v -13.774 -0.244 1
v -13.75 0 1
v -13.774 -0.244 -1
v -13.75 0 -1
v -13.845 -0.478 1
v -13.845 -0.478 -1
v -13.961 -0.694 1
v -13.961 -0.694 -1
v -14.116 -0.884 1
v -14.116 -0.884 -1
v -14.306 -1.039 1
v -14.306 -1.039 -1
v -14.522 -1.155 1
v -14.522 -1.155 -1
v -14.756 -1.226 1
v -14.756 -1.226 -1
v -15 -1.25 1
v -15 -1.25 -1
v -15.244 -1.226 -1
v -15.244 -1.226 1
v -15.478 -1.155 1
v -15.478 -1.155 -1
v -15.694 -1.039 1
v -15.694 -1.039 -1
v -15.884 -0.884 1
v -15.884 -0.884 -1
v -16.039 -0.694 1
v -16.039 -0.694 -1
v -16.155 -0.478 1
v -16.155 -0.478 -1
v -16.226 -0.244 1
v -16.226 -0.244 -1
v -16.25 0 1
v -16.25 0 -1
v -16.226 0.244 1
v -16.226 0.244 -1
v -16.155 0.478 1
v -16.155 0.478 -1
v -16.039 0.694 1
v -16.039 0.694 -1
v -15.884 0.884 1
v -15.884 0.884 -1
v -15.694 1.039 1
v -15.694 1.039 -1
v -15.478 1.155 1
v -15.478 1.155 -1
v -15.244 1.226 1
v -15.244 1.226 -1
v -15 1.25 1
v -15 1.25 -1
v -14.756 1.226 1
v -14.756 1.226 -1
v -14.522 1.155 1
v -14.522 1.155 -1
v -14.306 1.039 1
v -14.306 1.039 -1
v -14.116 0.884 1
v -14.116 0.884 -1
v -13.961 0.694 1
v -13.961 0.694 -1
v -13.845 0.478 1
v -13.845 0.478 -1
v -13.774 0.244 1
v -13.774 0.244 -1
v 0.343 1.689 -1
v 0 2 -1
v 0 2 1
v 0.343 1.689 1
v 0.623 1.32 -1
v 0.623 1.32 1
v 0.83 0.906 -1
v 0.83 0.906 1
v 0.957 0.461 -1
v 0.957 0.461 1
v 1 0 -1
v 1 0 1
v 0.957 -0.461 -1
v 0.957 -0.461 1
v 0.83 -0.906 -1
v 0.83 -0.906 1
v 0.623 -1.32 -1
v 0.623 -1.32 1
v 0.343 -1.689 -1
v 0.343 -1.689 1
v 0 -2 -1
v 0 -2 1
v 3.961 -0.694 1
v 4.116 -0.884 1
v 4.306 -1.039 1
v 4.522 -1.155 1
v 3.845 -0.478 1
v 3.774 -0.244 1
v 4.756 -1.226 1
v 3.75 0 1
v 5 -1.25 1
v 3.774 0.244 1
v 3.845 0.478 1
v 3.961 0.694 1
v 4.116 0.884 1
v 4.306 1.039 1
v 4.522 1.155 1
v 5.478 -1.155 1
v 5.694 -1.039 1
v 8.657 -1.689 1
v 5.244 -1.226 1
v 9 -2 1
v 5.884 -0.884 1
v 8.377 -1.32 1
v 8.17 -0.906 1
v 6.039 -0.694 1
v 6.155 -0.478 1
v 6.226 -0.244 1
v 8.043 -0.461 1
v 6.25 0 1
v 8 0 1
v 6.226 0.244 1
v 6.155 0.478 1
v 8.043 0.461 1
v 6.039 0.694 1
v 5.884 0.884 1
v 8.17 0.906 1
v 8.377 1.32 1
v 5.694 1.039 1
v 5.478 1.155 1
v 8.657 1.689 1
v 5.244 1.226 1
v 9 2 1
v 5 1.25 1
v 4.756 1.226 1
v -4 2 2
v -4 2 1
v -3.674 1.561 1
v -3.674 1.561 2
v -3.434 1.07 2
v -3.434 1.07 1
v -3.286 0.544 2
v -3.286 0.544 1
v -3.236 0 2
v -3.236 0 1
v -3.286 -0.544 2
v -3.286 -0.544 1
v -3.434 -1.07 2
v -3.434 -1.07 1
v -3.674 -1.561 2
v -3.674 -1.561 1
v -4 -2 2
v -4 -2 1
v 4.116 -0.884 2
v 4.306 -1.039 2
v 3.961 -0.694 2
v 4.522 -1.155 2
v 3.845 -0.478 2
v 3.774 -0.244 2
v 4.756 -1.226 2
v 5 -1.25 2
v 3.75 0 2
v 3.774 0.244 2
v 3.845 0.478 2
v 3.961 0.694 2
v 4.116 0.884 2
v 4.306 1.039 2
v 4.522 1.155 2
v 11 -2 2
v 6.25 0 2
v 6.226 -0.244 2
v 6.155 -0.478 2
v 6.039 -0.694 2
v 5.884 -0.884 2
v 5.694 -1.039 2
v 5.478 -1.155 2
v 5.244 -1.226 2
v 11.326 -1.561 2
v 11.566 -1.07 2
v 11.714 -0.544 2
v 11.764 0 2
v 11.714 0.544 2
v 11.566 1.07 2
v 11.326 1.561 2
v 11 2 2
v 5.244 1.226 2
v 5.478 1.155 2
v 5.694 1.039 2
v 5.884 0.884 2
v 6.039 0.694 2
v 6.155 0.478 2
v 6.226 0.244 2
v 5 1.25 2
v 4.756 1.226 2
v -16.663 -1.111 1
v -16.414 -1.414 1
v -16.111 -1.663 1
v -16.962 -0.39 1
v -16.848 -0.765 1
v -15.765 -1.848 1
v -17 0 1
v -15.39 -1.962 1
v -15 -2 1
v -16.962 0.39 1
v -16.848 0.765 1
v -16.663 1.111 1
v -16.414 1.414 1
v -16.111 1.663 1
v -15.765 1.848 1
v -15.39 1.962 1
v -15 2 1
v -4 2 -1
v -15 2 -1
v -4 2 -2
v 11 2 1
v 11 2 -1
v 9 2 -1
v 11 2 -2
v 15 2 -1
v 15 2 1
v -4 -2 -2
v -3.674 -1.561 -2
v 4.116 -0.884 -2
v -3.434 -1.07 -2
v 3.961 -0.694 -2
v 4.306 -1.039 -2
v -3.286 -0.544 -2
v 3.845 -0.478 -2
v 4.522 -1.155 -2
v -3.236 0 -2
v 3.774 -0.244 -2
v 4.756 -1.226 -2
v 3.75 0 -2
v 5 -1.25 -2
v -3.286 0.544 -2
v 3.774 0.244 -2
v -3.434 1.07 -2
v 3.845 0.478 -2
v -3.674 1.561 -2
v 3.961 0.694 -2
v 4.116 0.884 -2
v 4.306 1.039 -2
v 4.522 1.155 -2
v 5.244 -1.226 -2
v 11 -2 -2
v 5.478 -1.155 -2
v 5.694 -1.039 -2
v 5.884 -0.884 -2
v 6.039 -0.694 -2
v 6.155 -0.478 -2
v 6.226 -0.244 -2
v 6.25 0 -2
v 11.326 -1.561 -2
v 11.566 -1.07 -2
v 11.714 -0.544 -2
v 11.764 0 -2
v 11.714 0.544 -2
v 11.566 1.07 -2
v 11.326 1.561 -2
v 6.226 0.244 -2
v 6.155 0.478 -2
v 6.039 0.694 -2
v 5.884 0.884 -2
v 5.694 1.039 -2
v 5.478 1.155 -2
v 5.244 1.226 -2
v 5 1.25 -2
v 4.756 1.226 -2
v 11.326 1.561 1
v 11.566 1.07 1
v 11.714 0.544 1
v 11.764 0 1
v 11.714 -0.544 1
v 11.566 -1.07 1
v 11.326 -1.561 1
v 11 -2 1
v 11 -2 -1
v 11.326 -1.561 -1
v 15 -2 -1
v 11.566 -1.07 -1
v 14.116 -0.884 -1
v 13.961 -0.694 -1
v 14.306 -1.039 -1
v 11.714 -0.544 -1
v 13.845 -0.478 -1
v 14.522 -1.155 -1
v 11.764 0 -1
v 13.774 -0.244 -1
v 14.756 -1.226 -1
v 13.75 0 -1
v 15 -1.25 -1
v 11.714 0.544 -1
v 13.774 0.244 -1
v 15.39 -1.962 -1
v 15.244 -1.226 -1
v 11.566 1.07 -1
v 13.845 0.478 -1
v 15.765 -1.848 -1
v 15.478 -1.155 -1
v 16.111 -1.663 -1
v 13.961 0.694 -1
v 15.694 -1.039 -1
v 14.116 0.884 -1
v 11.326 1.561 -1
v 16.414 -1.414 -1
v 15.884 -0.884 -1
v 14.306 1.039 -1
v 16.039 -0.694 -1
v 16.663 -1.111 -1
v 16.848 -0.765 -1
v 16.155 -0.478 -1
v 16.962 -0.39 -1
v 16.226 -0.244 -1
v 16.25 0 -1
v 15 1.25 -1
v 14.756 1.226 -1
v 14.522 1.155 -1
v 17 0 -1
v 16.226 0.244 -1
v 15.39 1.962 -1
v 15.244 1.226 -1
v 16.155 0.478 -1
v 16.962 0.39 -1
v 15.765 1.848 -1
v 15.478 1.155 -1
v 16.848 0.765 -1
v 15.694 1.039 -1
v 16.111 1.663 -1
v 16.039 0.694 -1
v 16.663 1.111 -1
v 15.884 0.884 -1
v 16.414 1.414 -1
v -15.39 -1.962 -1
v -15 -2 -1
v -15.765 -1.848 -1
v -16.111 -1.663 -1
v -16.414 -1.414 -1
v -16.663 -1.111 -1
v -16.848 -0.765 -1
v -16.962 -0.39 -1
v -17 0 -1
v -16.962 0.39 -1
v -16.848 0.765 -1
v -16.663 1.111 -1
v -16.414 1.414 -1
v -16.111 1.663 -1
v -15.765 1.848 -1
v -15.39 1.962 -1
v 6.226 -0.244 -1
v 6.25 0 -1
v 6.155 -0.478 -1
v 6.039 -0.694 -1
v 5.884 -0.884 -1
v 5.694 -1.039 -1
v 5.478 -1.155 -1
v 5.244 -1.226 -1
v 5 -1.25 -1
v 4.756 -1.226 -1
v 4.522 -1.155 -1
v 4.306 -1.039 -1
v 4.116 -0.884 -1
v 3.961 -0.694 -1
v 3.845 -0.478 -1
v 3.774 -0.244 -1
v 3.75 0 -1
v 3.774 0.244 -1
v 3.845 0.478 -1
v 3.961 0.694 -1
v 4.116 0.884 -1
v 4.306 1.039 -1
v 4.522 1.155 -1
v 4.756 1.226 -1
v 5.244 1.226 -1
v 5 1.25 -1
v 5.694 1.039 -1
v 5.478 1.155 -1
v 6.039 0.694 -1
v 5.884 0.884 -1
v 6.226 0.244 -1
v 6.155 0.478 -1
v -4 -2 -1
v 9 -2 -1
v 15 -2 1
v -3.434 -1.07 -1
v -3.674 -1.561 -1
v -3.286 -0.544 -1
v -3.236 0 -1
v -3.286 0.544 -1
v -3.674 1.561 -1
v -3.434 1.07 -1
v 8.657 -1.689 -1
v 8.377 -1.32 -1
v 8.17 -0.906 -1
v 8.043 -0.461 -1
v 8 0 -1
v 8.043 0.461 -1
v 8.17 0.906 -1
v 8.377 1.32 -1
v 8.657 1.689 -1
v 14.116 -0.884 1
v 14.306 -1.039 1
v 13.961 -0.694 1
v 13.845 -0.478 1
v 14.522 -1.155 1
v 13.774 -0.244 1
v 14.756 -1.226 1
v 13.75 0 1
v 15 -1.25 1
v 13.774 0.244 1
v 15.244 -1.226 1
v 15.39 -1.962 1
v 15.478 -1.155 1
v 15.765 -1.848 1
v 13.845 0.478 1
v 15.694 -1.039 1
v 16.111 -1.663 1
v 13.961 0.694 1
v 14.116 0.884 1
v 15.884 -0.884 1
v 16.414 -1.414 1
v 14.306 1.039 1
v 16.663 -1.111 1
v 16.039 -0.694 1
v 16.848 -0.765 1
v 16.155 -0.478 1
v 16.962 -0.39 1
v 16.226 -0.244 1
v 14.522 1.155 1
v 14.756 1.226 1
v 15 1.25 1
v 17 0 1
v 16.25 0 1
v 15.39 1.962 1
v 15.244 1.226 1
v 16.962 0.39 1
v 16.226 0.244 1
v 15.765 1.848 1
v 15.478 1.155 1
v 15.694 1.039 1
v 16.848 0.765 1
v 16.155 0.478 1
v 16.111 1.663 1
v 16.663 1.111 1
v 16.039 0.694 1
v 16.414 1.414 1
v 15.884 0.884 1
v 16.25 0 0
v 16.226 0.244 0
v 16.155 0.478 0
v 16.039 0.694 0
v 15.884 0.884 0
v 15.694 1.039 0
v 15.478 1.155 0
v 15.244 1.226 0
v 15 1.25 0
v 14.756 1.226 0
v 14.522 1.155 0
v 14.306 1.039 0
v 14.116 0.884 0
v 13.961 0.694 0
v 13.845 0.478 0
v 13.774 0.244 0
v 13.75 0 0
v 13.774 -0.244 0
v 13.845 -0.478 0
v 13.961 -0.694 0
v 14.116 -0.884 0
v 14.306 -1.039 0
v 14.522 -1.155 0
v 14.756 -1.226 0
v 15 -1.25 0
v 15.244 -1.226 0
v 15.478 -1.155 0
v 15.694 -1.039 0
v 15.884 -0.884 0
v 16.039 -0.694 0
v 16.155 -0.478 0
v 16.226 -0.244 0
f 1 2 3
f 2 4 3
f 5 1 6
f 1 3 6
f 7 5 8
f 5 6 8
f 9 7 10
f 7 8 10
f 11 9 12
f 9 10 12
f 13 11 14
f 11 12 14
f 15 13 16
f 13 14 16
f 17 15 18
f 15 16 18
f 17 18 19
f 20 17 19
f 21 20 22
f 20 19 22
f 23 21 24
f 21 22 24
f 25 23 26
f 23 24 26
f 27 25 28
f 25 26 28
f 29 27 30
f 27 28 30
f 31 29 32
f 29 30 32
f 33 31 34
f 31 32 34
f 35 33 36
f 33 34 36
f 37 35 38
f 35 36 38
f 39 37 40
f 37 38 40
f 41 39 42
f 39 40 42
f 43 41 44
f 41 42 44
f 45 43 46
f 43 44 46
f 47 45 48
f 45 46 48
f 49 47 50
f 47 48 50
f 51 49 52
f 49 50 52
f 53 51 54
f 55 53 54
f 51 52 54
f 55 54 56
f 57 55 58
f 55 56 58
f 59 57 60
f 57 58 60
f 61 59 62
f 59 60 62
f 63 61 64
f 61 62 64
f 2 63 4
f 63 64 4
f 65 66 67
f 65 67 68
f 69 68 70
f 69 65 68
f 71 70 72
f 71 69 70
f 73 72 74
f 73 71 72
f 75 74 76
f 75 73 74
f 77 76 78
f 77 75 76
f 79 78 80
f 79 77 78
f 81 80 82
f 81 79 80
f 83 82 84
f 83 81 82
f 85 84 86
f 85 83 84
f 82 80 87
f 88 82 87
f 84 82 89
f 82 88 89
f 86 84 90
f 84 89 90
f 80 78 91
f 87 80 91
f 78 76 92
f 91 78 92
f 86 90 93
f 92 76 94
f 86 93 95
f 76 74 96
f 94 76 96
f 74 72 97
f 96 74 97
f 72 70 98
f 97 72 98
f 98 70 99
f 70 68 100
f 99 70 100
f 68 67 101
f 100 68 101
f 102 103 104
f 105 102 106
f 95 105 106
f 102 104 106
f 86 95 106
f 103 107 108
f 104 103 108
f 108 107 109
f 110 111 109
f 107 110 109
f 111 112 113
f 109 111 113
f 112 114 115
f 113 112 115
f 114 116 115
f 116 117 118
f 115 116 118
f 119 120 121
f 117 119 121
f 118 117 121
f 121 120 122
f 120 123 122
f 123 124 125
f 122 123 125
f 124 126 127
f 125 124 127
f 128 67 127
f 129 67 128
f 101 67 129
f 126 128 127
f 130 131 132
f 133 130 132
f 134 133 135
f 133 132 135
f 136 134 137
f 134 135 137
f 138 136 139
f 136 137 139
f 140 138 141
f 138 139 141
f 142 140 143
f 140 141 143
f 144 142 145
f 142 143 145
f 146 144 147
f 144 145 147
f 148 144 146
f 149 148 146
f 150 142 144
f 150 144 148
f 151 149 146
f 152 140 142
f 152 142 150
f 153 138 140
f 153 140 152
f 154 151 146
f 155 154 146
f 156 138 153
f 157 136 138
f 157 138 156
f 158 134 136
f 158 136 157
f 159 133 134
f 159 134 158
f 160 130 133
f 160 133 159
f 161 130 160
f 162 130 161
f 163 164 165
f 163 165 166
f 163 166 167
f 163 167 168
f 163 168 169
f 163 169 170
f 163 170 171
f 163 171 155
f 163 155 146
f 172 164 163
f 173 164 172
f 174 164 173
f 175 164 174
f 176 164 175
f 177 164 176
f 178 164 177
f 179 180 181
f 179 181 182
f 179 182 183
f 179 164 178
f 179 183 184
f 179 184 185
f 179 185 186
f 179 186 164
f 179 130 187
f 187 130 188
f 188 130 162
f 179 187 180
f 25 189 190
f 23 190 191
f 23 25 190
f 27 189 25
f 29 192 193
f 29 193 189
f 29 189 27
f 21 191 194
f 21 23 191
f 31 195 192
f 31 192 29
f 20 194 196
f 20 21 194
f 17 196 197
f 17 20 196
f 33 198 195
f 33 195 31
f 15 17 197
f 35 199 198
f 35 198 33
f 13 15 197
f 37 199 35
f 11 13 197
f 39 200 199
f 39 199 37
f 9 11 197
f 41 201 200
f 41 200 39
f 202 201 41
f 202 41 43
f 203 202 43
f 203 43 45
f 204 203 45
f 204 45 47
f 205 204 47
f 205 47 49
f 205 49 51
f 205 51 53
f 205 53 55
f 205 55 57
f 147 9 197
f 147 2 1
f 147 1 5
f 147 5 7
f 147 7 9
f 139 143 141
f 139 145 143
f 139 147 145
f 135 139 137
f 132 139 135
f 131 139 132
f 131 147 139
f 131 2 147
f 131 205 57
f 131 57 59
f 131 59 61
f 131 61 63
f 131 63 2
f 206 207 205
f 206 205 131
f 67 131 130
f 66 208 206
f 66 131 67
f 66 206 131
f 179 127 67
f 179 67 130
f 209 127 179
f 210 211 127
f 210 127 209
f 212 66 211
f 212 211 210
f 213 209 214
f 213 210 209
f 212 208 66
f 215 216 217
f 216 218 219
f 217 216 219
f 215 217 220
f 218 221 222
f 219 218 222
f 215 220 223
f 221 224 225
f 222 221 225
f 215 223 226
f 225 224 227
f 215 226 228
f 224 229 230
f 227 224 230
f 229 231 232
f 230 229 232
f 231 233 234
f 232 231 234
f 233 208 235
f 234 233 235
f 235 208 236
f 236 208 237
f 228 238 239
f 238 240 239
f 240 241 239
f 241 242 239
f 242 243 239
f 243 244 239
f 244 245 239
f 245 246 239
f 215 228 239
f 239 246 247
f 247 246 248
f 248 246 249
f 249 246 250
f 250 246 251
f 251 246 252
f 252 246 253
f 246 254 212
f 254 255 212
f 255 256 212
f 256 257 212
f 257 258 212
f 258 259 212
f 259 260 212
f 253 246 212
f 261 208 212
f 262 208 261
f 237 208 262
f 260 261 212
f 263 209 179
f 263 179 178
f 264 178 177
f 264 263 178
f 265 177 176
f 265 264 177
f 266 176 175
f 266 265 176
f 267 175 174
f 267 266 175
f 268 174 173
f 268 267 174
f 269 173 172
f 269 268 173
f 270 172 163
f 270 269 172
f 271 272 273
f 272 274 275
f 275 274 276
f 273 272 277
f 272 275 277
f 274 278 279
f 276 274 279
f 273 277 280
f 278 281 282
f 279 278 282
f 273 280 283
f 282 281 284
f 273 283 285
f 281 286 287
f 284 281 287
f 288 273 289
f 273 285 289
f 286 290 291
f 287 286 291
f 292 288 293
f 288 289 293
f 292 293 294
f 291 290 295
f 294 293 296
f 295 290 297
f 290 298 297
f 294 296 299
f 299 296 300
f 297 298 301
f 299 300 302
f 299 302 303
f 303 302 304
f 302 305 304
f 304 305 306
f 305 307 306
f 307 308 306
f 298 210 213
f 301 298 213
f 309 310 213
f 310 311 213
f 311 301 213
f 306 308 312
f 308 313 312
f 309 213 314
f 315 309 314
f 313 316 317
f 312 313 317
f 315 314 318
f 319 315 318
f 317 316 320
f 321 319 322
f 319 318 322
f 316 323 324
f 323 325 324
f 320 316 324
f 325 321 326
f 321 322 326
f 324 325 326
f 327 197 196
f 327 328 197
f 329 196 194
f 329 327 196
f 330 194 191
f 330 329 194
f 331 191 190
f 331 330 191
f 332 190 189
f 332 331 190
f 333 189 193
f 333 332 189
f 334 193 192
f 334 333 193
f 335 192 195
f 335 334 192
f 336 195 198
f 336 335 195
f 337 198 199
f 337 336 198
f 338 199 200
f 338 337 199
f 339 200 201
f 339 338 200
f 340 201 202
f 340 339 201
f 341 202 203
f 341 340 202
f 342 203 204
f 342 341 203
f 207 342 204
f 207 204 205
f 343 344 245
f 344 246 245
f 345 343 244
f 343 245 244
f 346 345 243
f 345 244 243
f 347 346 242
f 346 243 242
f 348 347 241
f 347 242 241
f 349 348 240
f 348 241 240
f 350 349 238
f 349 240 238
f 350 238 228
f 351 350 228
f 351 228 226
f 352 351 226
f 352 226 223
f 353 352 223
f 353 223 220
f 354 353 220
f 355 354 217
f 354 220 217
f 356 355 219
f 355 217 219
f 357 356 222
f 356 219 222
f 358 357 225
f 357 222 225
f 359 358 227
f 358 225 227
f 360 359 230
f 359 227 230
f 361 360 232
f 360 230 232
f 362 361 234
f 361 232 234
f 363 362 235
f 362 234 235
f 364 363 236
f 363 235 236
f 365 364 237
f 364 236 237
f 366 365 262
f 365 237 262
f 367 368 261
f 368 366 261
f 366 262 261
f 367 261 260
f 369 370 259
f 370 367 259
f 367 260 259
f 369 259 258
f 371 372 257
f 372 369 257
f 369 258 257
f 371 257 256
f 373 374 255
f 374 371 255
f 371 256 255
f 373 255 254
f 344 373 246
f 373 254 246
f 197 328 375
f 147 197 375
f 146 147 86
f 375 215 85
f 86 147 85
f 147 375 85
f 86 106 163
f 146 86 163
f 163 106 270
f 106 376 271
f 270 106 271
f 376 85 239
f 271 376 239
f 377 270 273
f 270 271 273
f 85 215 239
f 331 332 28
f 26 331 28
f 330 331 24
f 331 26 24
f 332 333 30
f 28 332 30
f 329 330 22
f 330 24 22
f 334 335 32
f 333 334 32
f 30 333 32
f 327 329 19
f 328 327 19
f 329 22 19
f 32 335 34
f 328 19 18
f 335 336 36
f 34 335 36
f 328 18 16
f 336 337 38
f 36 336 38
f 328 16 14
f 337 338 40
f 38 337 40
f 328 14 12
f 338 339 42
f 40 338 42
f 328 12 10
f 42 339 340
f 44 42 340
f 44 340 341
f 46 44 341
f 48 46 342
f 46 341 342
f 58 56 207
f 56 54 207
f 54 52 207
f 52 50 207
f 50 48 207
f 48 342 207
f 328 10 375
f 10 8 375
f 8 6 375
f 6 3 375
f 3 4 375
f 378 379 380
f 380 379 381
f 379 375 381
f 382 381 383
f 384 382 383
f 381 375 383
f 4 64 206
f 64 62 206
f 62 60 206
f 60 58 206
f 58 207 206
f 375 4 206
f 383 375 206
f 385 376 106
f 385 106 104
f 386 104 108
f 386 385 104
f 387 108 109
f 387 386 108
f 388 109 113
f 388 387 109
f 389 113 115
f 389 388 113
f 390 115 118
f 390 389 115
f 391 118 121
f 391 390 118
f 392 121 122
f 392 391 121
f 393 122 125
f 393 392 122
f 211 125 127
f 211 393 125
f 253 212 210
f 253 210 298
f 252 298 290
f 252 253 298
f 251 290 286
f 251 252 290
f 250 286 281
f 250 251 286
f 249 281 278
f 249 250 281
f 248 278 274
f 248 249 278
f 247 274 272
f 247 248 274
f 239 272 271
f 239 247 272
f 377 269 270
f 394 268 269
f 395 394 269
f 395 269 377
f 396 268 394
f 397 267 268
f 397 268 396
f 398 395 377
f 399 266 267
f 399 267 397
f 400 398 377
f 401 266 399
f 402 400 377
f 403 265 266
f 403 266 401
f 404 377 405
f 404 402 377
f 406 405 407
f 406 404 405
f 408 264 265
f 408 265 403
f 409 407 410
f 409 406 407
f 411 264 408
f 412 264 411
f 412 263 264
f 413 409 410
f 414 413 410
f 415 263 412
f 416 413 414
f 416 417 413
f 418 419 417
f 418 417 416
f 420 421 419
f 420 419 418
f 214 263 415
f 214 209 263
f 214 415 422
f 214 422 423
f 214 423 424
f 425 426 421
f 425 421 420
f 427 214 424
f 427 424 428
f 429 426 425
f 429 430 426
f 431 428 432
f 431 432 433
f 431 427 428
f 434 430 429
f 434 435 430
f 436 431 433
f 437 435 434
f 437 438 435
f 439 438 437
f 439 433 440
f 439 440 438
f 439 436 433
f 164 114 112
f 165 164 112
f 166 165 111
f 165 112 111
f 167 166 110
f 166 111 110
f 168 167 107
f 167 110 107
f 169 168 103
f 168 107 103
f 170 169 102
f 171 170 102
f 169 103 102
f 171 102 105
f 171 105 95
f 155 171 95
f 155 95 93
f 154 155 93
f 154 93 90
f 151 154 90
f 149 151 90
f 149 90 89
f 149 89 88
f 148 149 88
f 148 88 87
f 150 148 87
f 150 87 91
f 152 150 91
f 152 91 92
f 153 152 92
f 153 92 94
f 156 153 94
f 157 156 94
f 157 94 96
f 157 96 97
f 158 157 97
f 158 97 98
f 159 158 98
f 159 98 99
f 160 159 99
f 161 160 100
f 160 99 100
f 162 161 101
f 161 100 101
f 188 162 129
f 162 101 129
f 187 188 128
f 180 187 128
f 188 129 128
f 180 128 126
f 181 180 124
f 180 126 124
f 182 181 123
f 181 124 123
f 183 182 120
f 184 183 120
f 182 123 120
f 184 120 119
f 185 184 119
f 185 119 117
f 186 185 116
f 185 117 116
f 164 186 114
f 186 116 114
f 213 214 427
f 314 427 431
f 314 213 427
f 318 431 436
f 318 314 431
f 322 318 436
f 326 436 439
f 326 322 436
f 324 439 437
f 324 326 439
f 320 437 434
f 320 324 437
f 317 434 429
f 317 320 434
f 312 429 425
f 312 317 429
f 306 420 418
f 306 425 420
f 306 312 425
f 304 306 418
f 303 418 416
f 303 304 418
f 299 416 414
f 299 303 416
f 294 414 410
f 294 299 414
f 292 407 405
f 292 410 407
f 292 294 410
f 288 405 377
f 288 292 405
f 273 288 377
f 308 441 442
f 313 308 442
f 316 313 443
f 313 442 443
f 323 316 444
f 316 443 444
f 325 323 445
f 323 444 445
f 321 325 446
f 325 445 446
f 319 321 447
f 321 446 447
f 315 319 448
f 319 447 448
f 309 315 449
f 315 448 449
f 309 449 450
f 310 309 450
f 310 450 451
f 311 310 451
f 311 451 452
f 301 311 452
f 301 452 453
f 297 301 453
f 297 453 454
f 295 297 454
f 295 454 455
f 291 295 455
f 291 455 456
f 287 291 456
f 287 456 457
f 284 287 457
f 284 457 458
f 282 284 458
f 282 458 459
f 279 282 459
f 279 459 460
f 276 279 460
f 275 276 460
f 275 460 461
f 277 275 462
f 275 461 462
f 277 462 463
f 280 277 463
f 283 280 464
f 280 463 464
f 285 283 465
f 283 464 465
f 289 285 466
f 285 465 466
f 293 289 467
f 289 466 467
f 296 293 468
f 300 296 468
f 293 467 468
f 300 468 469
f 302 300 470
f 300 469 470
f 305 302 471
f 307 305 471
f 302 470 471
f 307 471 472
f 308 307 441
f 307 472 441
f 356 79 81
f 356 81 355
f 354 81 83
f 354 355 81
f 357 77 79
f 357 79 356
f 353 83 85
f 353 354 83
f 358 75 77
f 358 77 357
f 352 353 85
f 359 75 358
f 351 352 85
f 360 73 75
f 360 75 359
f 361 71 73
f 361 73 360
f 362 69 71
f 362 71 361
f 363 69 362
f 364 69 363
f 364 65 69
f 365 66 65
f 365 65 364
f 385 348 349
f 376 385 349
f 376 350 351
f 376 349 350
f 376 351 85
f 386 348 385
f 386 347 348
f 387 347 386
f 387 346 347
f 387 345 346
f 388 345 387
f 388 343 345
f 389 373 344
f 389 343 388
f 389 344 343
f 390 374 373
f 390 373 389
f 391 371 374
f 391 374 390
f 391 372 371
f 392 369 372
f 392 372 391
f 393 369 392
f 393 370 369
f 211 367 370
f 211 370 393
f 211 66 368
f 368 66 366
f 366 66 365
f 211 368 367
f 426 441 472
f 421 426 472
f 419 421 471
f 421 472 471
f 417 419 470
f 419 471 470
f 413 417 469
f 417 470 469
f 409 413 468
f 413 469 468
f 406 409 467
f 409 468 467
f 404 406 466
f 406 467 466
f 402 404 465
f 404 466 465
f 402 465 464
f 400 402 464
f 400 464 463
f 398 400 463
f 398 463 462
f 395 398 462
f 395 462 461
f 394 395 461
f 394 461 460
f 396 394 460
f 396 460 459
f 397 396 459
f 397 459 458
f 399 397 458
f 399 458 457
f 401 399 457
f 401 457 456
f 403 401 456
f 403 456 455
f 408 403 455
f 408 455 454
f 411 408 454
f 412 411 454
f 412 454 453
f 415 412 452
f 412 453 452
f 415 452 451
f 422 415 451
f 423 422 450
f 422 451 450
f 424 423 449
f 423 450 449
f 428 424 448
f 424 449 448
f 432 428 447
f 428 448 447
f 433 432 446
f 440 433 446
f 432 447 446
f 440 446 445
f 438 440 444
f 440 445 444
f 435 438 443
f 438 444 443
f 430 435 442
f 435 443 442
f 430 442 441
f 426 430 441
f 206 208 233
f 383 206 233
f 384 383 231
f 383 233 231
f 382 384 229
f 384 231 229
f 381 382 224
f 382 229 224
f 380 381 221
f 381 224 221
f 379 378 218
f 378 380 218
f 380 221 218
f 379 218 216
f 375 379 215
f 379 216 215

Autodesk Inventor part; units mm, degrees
ref_plane "YZ Plane" through (0, 0, 0) normal (1, 0, 0) x (0, 1, 0)
ref_plane "XZ Plane" through (0, 0, 0) normal (0, 1, 0) x (-1, 0, 0)
ref_plane "XY Plane" through (0, 0, 0) normal (0, 0, 1) x (1, 0, 0)
sketch "Sketch1" plane through (0, 0, 0) normal (0, 0, 1) x (1, 0, 0)
  line L0 (0, 0) -> (15, 0)
  line L1 (0, 0) -> (-15, 0)
  line L2 (0, 0) -> (5, 0)
  circle A0 centre (-15, 0) radius 1.25
  circle A1 centre (15, 0) radius 1.25
  circle A2 centre (-15, 0) radius 2
  circle A3 centre (15, 0) radius 2
  line L3 (-15, 2) -> (15, 2)
  line L4 (-15, -2) -> (15, -2)
  circle A4 centre (5, 0) radius 1.25
  line L5 (-15, 2) -> (-4, 2)
  line L6 (-4, 2) -> (-4, -2)
  line L7 (-4, -2) -> (-15, -2)
  line L8 (-15, -2) -> (-15, 2)
  line L9 (15, 2) -> (12.5, 2)
  line L10 (12.5, -2) -> (15, -2)
  line L11 (15, -2) -> (15, 2)
  line L12 (15, 2) -> (14.5, 2)
  line L13 (15, -2) -> (14.5, -2)
  arc A5 (-4, -2) -> (-4, 2) centre (-6.2361, 0) ccw
  line L14 (5, 0) -> (1, 0)
  arc A6 (0, -2) -> (0, 2) centre (-1.5, 0) ccw
  line L15 (0, 2) -> (0, -2)
  line L16 (5, 2) -> (9, 2)
  line L17 (9, 2) -> (9, -2)
  line L18 (5, 0) -> (8, 0)
  arc A7 (9, 2) -> (9, -2) centre (10.5, 0) ccw
  line L19 (-15, 2) -> (-14.5, 2)
  line L20 (-15, -2) -> (-14.5, -2)
  arc A8 (-14.5, -2) -> (-14.5, 2) centre (-14.5, 0) ccw
  line L21 (9, 2) -> (11, 2)
  line L22 (9, -2) -> (11, -2)
  arc A9 (11, -2) -> (11, 2) centre (8.7639, 0) ccw
  point P0 (-4, 2)
  dimension "d1" = 15
  dimension "d2" = 15
  dimension "d3" = 5
  dimension "d4" = 2.5
  dimension "d6" = 2.5
  dimension "d7" = 4
  dimension "d8" = 4
  dimension "d9" = 2.5
  dimension "d10" = 11
  dimension "d16" = 4
  dimension "d17" = 3
  dimension "d18" = 4
  dimension "d21" = 4
  dimension "d23" = 3
  dimension "d24" = 0.5
  dimension "d25" = 0.5
  dimension "d26" = 2
  dimension "d35" = 2
  dimension "d36" = 2
  dimension "d37" = 3
  dimension "d38" = 4
extrude "Extrusion1" add sketch "Sketch1" along normal mid plane 2 contours A5 L6 L1 | L1 L6 A5 | L6 L4 A8 L1 | L1 A8 L3 L6 | A8 L4 A2 L1 | L1 A2 L3 A8 | A9 L0 A3 L4 | A2 L8 A0 L1 | L1 A0 L8 A2 | A2 L8 A0 | L3 A3 L0 A9 | A3 L11 A1 L0 | L0 A1 L11 A3 | L11 A1 A3
extrude "Extrusion2" add sketch "Sketch1" along normal mid plane 4 contours L15 A6 L0 | L15 L4 A5 L1 | L1 A5 L3 L15 | L0 A6 L15 | L17 L0 A9 L4 | A7 L0 L17 | L3 A9 L0 L17 | L17 L0 A7
extrude "Extrusion3" add sketch "Sketch1" along normal mid plane 4 contours A6 L3 A7 L0 A4 | L0 A4 A7 L4 A6
extrude "Extrusion4" cut sketch "Sketch1" along normal mid plane 2 contours A6 L3 A7 L0 A4 | L0 A4 A7 L4 A6
properties part number "link7" material "Aluminum 6061"
